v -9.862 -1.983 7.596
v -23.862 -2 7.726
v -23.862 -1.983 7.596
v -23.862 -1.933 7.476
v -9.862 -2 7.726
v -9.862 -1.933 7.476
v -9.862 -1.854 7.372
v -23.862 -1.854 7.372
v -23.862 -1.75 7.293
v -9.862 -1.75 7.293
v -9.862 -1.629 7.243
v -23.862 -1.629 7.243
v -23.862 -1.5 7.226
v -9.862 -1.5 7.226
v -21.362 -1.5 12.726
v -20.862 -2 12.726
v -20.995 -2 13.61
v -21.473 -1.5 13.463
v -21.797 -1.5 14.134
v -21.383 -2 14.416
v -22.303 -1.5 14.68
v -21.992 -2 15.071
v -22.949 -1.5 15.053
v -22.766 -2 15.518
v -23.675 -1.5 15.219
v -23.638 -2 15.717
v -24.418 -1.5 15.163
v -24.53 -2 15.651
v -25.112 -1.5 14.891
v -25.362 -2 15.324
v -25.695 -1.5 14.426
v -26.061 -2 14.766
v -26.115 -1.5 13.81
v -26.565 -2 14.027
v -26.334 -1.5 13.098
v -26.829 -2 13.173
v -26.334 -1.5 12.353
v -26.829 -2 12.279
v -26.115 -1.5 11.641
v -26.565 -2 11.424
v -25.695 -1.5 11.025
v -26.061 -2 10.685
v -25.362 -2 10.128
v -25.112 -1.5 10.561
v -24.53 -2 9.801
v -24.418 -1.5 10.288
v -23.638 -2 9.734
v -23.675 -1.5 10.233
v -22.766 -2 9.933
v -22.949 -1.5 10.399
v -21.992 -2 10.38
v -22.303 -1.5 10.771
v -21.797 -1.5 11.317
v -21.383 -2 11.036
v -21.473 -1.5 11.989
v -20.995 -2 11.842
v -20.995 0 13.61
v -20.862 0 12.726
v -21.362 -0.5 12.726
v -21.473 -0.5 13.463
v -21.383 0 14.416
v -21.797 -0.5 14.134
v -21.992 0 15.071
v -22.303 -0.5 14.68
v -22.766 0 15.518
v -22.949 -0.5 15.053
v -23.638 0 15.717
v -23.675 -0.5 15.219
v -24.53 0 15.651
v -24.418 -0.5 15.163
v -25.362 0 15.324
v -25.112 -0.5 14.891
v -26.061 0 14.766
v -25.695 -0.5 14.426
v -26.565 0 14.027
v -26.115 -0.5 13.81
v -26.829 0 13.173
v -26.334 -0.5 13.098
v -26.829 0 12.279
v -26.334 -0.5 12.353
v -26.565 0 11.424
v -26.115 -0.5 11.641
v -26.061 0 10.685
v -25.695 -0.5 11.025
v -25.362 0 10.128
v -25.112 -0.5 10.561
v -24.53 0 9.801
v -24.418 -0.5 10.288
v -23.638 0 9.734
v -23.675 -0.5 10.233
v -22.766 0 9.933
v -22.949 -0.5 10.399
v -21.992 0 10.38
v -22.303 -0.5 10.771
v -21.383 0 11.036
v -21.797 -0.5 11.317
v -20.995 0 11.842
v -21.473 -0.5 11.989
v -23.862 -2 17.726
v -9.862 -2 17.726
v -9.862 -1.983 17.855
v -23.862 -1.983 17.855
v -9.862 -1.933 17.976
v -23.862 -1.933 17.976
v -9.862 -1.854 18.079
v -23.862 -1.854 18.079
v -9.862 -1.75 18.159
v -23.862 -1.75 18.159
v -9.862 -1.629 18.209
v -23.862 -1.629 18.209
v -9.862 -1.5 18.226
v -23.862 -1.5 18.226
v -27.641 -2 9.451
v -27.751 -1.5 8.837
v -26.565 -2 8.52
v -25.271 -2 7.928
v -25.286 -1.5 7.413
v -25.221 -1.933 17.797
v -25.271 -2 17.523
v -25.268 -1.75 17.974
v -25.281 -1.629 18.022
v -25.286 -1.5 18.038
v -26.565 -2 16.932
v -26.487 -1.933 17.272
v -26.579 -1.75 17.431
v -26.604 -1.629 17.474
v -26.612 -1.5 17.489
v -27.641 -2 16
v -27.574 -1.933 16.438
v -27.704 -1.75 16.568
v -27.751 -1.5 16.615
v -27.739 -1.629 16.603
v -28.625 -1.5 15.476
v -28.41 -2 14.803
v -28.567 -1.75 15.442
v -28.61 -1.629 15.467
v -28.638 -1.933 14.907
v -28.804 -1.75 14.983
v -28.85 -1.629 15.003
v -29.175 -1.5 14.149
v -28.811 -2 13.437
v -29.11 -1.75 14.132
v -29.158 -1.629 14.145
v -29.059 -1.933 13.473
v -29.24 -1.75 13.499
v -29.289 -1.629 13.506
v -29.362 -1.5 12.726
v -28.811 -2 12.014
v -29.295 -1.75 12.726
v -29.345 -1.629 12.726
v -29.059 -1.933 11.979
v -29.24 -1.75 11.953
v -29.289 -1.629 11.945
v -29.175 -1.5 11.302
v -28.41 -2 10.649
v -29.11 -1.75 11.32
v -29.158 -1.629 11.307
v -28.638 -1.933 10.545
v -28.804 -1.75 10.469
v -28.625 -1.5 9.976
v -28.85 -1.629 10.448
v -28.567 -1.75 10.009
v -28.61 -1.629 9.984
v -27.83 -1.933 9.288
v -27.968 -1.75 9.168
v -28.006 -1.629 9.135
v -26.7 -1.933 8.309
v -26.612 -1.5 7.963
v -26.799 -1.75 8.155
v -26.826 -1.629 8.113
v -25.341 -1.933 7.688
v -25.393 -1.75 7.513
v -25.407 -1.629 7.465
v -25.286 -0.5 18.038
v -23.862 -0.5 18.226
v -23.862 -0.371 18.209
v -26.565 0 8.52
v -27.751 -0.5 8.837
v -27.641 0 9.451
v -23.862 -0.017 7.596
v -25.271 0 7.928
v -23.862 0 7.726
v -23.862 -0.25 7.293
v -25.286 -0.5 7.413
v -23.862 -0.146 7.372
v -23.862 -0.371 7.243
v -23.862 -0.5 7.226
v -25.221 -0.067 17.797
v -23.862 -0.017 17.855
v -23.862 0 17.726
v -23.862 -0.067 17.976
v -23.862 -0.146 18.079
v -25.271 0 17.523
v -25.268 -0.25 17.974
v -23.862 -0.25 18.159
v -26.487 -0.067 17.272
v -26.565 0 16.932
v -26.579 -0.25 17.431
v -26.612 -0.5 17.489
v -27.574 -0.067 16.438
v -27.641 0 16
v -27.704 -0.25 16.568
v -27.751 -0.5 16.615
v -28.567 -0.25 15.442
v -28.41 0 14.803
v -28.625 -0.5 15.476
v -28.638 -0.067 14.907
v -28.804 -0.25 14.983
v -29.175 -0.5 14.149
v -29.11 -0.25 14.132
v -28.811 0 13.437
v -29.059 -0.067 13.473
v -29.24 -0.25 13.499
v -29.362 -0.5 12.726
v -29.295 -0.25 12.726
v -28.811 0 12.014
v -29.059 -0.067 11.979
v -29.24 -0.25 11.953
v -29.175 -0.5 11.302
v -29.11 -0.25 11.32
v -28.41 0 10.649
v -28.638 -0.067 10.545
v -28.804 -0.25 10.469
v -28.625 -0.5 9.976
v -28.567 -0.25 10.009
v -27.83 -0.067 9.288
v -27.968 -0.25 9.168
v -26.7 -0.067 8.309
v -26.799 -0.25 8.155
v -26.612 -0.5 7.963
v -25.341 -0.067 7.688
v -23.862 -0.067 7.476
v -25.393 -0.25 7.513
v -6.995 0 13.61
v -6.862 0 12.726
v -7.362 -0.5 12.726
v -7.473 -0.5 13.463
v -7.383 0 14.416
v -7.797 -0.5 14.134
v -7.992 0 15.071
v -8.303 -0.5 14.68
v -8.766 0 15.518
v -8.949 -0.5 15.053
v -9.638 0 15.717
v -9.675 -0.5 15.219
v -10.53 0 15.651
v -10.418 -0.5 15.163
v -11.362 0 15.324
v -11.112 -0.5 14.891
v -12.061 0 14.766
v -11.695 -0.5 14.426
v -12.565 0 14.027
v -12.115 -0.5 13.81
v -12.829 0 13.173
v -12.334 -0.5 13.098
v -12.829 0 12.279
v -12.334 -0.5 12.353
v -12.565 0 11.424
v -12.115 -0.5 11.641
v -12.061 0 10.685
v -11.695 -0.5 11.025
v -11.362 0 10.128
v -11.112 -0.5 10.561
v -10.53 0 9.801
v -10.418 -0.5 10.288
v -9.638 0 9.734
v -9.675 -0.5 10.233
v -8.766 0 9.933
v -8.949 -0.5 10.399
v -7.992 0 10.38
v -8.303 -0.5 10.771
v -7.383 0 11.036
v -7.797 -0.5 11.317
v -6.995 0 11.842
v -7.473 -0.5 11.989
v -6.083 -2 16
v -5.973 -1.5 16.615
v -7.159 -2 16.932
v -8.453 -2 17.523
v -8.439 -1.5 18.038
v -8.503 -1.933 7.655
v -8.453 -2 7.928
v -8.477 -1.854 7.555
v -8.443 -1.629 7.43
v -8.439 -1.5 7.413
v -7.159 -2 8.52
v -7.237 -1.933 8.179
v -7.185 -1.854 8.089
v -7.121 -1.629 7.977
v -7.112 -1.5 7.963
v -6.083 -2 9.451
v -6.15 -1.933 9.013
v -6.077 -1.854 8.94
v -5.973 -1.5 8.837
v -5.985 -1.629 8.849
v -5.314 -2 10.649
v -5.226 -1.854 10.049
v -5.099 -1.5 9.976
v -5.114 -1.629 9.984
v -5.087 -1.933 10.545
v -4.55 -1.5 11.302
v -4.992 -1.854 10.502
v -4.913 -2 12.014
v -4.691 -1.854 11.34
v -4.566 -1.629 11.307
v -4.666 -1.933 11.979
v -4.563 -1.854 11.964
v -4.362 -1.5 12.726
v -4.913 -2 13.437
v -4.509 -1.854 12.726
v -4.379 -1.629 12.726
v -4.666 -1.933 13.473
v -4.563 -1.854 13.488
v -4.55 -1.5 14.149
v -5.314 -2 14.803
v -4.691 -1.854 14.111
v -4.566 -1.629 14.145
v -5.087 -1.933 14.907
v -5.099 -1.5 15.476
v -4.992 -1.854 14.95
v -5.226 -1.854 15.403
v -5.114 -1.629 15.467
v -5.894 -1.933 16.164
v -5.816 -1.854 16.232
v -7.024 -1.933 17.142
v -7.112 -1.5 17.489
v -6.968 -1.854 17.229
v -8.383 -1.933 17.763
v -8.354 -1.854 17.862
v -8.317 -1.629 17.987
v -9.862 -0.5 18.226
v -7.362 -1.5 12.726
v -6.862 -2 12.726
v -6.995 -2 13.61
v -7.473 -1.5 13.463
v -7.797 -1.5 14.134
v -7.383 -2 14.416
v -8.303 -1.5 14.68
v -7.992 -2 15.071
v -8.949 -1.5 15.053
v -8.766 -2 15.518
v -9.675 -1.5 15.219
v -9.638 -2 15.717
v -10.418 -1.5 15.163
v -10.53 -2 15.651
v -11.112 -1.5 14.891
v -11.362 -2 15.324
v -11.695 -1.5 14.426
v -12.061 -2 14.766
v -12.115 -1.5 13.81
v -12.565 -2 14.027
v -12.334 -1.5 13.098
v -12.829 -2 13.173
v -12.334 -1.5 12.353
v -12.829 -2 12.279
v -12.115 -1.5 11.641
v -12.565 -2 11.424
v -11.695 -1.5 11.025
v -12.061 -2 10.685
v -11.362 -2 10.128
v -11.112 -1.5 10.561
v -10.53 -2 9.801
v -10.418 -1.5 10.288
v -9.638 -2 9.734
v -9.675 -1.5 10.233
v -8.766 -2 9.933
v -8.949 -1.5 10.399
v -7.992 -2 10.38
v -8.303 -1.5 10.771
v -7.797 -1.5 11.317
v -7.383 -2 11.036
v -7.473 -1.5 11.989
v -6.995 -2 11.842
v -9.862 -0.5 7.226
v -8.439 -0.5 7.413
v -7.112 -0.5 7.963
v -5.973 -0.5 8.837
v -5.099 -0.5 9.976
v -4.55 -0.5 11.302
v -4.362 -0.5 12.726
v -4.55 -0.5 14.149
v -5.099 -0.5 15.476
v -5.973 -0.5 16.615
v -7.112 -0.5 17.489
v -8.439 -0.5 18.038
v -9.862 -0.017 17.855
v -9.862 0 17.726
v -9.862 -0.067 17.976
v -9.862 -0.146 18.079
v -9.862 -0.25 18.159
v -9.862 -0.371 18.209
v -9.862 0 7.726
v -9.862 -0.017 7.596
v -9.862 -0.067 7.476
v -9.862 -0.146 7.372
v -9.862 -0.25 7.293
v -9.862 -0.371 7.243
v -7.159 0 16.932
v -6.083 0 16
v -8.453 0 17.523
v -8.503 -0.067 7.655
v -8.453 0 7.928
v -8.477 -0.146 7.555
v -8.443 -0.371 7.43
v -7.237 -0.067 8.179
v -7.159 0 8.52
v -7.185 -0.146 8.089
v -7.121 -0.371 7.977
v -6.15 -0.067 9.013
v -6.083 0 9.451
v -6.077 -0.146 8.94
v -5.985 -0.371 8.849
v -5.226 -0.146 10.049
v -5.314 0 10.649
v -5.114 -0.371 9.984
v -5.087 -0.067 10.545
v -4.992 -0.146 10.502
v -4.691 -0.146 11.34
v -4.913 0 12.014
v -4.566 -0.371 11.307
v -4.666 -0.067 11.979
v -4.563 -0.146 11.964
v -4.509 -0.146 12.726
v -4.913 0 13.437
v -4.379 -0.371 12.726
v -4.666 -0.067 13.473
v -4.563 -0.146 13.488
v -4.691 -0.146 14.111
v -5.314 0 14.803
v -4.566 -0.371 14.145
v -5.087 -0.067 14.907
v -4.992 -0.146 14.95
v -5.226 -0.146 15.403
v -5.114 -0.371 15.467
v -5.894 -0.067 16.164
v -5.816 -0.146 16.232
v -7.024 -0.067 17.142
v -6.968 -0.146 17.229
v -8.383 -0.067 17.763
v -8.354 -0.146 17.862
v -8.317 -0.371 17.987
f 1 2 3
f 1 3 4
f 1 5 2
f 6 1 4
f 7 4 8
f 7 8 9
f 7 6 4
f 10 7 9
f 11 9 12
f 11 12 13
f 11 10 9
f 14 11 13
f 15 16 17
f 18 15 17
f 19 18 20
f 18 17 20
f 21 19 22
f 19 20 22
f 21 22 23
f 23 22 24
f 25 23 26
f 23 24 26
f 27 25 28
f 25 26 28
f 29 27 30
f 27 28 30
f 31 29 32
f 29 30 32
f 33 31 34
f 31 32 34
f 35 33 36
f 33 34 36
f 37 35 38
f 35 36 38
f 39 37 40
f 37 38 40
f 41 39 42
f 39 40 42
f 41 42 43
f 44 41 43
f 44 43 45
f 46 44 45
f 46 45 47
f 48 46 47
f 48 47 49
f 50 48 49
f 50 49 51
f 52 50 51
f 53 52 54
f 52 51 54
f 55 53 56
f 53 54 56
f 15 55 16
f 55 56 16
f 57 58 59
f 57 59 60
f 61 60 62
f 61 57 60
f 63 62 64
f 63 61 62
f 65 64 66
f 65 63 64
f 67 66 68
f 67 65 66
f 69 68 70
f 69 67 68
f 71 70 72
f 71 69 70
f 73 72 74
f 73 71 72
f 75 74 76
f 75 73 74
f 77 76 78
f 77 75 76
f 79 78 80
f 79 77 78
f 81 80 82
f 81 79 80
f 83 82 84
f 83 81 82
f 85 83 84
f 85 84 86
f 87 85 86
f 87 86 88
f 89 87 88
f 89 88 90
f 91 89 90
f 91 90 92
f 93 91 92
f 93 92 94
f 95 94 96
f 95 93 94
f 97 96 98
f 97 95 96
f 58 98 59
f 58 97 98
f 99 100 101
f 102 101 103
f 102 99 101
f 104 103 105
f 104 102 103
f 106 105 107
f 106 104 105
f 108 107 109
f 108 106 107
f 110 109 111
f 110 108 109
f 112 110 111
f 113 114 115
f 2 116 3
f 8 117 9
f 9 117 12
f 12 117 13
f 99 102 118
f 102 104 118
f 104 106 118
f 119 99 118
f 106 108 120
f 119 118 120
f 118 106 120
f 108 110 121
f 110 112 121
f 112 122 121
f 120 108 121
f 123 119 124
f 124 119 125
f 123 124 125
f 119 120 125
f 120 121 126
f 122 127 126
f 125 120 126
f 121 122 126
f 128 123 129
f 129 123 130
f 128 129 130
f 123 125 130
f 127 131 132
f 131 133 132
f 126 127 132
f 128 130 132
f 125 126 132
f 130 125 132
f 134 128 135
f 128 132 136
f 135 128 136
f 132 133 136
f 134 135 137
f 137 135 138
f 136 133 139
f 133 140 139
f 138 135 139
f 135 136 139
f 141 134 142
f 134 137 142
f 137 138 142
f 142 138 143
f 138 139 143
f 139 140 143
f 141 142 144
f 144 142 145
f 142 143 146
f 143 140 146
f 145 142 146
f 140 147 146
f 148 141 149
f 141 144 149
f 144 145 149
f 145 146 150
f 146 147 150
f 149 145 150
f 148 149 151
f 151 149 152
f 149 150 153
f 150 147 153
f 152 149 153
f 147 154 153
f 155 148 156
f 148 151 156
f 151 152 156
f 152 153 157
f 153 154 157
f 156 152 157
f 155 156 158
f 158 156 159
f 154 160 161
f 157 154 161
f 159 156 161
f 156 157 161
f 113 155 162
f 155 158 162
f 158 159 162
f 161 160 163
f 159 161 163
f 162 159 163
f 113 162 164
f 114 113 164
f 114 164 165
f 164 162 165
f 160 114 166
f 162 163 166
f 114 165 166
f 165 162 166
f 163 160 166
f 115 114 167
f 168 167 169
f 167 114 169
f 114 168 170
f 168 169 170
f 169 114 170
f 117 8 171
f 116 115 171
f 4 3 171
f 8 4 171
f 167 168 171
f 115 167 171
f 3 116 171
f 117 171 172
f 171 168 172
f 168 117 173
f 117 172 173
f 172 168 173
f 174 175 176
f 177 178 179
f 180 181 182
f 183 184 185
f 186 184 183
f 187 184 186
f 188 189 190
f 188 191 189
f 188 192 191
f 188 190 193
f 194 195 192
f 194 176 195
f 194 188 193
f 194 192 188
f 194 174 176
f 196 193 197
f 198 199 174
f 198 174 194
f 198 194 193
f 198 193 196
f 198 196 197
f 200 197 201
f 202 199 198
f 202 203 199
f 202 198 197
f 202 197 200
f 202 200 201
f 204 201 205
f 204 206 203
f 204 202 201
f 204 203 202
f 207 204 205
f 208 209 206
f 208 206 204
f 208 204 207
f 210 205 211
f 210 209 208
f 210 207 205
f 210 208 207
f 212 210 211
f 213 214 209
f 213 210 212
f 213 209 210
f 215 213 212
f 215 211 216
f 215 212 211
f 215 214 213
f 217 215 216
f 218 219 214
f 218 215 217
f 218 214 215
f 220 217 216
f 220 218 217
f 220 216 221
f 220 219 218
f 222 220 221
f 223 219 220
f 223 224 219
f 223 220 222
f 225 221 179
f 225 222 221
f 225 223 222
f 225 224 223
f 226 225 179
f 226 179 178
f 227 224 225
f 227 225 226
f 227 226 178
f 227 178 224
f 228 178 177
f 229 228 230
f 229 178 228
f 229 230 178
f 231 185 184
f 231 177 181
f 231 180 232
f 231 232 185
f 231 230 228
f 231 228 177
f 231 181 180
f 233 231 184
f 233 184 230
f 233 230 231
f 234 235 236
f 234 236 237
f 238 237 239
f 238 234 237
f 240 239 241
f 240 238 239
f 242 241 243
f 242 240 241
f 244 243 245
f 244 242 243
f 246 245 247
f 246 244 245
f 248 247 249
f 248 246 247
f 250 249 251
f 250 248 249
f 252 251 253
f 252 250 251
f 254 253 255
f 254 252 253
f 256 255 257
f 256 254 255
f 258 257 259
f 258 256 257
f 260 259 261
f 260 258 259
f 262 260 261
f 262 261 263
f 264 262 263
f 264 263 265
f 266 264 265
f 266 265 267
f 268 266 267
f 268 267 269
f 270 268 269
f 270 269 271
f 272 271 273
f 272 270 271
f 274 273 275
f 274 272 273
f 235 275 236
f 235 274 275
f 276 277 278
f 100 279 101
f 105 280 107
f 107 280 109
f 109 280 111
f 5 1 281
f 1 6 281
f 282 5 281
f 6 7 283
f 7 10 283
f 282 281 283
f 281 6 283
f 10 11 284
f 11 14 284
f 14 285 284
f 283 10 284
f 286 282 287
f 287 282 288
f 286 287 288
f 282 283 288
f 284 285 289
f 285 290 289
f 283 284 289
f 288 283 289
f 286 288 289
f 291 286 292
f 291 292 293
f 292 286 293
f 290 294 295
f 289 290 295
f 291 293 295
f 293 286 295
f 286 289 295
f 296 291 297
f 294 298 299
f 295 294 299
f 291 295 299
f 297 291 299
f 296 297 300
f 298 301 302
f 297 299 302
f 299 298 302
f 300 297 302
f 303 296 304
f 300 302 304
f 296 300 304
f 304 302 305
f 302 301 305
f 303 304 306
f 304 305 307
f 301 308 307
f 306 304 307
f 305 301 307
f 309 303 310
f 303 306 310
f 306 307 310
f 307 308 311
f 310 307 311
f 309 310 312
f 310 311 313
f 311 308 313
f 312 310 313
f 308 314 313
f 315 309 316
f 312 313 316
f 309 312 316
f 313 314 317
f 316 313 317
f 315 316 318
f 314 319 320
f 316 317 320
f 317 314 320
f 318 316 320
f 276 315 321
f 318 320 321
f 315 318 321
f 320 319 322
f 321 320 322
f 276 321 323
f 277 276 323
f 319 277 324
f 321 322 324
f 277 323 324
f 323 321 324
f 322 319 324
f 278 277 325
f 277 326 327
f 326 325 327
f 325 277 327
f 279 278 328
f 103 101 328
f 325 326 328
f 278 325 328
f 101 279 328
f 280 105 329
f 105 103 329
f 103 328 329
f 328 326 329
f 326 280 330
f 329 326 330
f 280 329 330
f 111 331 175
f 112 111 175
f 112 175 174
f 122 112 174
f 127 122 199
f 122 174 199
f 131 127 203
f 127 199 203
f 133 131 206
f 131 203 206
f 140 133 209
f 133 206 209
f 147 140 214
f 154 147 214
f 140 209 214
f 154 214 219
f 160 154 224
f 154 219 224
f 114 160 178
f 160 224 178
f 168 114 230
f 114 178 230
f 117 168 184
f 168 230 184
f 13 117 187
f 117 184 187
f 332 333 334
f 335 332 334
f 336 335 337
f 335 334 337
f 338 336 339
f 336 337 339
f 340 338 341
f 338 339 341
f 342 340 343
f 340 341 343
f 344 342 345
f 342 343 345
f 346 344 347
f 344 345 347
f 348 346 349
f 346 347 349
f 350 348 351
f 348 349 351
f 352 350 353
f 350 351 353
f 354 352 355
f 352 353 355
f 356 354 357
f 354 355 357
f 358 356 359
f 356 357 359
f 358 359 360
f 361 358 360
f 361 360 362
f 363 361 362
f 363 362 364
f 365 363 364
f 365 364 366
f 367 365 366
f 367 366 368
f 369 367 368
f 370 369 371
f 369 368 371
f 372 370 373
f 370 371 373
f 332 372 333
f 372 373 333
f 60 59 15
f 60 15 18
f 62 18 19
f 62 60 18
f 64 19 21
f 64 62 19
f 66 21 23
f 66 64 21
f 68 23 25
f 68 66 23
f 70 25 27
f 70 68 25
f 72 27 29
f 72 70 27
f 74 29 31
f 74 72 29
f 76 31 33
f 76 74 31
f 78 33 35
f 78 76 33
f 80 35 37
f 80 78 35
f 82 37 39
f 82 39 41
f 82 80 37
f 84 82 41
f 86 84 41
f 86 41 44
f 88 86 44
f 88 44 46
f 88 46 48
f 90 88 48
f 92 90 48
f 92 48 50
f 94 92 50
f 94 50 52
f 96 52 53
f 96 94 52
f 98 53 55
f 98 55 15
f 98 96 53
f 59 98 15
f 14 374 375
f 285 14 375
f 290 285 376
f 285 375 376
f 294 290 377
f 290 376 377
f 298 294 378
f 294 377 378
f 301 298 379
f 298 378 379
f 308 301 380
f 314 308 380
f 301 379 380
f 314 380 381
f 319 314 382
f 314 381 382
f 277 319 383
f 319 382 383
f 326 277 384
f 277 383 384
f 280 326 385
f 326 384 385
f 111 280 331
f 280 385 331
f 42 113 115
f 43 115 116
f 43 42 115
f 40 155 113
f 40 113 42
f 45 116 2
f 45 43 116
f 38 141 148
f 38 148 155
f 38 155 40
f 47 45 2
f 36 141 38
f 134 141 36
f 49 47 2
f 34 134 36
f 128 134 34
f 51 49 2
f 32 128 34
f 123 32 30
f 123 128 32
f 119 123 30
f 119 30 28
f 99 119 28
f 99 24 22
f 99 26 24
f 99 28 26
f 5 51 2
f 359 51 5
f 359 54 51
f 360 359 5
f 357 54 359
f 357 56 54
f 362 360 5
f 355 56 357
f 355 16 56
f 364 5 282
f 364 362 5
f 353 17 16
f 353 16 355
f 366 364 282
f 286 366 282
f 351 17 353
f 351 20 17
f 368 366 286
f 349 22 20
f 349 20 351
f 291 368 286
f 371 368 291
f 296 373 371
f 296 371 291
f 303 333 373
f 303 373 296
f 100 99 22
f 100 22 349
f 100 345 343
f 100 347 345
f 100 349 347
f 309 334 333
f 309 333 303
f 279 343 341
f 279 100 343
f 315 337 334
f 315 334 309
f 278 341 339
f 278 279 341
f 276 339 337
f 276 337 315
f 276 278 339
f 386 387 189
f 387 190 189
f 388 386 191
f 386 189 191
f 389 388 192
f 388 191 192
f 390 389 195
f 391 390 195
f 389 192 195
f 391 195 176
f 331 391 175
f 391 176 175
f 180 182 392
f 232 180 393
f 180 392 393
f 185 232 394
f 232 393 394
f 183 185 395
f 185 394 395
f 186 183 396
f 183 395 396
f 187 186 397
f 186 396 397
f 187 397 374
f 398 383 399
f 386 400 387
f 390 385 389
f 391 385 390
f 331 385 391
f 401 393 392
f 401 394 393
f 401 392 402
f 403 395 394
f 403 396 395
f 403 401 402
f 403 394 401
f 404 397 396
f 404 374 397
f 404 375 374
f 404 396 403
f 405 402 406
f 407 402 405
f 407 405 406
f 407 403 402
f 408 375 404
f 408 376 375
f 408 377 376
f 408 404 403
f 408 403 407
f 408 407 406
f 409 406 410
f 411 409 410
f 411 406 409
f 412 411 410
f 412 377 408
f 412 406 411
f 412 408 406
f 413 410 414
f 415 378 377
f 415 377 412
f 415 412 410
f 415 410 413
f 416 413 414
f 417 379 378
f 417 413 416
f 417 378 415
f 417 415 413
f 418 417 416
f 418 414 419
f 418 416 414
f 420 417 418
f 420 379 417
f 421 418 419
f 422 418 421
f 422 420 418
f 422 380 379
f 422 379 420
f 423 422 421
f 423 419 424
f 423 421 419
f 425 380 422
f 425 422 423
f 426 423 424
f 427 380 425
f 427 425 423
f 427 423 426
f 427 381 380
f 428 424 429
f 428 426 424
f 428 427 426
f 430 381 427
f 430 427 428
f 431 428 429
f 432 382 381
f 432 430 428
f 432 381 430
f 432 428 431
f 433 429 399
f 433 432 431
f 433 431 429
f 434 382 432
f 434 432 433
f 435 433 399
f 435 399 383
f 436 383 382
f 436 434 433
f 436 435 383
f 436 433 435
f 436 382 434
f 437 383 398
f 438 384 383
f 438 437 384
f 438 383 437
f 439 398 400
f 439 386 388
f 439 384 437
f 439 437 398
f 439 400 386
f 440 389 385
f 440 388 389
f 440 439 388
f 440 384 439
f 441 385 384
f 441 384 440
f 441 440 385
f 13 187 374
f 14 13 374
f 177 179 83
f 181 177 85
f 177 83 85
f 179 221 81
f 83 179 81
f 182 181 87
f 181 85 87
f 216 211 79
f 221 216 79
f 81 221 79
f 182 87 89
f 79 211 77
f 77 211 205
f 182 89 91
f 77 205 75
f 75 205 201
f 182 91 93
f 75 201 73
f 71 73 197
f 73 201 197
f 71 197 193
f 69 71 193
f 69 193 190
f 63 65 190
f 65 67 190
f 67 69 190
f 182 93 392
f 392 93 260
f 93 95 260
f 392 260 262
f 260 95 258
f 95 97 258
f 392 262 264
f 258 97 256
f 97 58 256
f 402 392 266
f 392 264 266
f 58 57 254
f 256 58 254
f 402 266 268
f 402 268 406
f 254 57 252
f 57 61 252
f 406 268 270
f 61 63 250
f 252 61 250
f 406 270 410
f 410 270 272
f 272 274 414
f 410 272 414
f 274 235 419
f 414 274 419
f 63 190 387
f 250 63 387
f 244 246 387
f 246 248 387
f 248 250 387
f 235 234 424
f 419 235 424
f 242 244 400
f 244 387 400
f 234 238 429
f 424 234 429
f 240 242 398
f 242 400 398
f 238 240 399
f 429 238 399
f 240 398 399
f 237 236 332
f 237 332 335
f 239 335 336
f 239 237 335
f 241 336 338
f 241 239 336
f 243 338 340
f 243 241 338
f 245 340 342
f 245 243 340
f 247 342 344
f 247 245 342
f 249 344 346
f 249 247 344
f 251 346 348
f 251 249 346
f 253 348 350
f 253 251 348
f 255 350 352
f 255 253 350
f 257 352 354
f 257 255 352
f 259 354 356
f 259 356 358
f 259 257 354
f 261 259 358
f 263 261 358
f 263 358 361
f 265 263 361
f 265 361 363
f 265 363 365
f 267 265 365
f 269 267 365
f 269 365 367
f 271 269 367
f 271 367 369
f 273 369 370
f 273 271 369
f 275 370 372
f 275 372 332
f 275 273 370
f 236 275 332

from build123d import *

# Parameters (mm, degrees)
F0_R     = 2.5
F1_DEPTH = 2
F2_SIZE  = 0.5
F3_R     = 0.5


with BuildPart() as f1:
    # F0 (on Front) → F1 (new body)
    with BuildSketch(Plane.XZ):
        with BuildLine():
            Line((-9.862112, 18.225786), (-23.862112, 18.225786))
            ThreePointArc((-23.862112, 18.225786), (-29.362112, 12.725786), (-23.862112, 7.225786))
            Line((-23.862112, 7.225786), (-9.862112, 7.225786))
            ThreePointArc((-9.862112, 7.225786), (-4.362112, 12.725786), (-9.862112, 18.225786))
        make_face()
        with Locations((-23.862112, 12.725786)):
            Circle(F0_R, mode=Mode.SUBTRACT)
        with Locations((-9.862112, 12.725786)):
            Circle(F0_R, mode=Mode.SUBTRACT)
    extrude(amount=F1_DEPTH)

    # F2
    f2_edges = [f1.edges().sort_by_distance(p)[0] for p in [
        (-26.362112, -2, 12.725786),
        (-26.362112, 0, 12.725786),
        (-12.362112, -2, 12.725786),
        (-12.362112, 0, 12.725786),
    ]]
    chamfer(f2_edges, length=F2_SIZE)

    # F3
    f3_edges = [f1.edges().sort_by_distance(p)[0] for p in [
        (-16.862112, -2, 7.225786),
        (-29.362112, 0, 12.725786),
    ]]
    fillet(f3_edges, radius=F3_R)


solid = f1.part
